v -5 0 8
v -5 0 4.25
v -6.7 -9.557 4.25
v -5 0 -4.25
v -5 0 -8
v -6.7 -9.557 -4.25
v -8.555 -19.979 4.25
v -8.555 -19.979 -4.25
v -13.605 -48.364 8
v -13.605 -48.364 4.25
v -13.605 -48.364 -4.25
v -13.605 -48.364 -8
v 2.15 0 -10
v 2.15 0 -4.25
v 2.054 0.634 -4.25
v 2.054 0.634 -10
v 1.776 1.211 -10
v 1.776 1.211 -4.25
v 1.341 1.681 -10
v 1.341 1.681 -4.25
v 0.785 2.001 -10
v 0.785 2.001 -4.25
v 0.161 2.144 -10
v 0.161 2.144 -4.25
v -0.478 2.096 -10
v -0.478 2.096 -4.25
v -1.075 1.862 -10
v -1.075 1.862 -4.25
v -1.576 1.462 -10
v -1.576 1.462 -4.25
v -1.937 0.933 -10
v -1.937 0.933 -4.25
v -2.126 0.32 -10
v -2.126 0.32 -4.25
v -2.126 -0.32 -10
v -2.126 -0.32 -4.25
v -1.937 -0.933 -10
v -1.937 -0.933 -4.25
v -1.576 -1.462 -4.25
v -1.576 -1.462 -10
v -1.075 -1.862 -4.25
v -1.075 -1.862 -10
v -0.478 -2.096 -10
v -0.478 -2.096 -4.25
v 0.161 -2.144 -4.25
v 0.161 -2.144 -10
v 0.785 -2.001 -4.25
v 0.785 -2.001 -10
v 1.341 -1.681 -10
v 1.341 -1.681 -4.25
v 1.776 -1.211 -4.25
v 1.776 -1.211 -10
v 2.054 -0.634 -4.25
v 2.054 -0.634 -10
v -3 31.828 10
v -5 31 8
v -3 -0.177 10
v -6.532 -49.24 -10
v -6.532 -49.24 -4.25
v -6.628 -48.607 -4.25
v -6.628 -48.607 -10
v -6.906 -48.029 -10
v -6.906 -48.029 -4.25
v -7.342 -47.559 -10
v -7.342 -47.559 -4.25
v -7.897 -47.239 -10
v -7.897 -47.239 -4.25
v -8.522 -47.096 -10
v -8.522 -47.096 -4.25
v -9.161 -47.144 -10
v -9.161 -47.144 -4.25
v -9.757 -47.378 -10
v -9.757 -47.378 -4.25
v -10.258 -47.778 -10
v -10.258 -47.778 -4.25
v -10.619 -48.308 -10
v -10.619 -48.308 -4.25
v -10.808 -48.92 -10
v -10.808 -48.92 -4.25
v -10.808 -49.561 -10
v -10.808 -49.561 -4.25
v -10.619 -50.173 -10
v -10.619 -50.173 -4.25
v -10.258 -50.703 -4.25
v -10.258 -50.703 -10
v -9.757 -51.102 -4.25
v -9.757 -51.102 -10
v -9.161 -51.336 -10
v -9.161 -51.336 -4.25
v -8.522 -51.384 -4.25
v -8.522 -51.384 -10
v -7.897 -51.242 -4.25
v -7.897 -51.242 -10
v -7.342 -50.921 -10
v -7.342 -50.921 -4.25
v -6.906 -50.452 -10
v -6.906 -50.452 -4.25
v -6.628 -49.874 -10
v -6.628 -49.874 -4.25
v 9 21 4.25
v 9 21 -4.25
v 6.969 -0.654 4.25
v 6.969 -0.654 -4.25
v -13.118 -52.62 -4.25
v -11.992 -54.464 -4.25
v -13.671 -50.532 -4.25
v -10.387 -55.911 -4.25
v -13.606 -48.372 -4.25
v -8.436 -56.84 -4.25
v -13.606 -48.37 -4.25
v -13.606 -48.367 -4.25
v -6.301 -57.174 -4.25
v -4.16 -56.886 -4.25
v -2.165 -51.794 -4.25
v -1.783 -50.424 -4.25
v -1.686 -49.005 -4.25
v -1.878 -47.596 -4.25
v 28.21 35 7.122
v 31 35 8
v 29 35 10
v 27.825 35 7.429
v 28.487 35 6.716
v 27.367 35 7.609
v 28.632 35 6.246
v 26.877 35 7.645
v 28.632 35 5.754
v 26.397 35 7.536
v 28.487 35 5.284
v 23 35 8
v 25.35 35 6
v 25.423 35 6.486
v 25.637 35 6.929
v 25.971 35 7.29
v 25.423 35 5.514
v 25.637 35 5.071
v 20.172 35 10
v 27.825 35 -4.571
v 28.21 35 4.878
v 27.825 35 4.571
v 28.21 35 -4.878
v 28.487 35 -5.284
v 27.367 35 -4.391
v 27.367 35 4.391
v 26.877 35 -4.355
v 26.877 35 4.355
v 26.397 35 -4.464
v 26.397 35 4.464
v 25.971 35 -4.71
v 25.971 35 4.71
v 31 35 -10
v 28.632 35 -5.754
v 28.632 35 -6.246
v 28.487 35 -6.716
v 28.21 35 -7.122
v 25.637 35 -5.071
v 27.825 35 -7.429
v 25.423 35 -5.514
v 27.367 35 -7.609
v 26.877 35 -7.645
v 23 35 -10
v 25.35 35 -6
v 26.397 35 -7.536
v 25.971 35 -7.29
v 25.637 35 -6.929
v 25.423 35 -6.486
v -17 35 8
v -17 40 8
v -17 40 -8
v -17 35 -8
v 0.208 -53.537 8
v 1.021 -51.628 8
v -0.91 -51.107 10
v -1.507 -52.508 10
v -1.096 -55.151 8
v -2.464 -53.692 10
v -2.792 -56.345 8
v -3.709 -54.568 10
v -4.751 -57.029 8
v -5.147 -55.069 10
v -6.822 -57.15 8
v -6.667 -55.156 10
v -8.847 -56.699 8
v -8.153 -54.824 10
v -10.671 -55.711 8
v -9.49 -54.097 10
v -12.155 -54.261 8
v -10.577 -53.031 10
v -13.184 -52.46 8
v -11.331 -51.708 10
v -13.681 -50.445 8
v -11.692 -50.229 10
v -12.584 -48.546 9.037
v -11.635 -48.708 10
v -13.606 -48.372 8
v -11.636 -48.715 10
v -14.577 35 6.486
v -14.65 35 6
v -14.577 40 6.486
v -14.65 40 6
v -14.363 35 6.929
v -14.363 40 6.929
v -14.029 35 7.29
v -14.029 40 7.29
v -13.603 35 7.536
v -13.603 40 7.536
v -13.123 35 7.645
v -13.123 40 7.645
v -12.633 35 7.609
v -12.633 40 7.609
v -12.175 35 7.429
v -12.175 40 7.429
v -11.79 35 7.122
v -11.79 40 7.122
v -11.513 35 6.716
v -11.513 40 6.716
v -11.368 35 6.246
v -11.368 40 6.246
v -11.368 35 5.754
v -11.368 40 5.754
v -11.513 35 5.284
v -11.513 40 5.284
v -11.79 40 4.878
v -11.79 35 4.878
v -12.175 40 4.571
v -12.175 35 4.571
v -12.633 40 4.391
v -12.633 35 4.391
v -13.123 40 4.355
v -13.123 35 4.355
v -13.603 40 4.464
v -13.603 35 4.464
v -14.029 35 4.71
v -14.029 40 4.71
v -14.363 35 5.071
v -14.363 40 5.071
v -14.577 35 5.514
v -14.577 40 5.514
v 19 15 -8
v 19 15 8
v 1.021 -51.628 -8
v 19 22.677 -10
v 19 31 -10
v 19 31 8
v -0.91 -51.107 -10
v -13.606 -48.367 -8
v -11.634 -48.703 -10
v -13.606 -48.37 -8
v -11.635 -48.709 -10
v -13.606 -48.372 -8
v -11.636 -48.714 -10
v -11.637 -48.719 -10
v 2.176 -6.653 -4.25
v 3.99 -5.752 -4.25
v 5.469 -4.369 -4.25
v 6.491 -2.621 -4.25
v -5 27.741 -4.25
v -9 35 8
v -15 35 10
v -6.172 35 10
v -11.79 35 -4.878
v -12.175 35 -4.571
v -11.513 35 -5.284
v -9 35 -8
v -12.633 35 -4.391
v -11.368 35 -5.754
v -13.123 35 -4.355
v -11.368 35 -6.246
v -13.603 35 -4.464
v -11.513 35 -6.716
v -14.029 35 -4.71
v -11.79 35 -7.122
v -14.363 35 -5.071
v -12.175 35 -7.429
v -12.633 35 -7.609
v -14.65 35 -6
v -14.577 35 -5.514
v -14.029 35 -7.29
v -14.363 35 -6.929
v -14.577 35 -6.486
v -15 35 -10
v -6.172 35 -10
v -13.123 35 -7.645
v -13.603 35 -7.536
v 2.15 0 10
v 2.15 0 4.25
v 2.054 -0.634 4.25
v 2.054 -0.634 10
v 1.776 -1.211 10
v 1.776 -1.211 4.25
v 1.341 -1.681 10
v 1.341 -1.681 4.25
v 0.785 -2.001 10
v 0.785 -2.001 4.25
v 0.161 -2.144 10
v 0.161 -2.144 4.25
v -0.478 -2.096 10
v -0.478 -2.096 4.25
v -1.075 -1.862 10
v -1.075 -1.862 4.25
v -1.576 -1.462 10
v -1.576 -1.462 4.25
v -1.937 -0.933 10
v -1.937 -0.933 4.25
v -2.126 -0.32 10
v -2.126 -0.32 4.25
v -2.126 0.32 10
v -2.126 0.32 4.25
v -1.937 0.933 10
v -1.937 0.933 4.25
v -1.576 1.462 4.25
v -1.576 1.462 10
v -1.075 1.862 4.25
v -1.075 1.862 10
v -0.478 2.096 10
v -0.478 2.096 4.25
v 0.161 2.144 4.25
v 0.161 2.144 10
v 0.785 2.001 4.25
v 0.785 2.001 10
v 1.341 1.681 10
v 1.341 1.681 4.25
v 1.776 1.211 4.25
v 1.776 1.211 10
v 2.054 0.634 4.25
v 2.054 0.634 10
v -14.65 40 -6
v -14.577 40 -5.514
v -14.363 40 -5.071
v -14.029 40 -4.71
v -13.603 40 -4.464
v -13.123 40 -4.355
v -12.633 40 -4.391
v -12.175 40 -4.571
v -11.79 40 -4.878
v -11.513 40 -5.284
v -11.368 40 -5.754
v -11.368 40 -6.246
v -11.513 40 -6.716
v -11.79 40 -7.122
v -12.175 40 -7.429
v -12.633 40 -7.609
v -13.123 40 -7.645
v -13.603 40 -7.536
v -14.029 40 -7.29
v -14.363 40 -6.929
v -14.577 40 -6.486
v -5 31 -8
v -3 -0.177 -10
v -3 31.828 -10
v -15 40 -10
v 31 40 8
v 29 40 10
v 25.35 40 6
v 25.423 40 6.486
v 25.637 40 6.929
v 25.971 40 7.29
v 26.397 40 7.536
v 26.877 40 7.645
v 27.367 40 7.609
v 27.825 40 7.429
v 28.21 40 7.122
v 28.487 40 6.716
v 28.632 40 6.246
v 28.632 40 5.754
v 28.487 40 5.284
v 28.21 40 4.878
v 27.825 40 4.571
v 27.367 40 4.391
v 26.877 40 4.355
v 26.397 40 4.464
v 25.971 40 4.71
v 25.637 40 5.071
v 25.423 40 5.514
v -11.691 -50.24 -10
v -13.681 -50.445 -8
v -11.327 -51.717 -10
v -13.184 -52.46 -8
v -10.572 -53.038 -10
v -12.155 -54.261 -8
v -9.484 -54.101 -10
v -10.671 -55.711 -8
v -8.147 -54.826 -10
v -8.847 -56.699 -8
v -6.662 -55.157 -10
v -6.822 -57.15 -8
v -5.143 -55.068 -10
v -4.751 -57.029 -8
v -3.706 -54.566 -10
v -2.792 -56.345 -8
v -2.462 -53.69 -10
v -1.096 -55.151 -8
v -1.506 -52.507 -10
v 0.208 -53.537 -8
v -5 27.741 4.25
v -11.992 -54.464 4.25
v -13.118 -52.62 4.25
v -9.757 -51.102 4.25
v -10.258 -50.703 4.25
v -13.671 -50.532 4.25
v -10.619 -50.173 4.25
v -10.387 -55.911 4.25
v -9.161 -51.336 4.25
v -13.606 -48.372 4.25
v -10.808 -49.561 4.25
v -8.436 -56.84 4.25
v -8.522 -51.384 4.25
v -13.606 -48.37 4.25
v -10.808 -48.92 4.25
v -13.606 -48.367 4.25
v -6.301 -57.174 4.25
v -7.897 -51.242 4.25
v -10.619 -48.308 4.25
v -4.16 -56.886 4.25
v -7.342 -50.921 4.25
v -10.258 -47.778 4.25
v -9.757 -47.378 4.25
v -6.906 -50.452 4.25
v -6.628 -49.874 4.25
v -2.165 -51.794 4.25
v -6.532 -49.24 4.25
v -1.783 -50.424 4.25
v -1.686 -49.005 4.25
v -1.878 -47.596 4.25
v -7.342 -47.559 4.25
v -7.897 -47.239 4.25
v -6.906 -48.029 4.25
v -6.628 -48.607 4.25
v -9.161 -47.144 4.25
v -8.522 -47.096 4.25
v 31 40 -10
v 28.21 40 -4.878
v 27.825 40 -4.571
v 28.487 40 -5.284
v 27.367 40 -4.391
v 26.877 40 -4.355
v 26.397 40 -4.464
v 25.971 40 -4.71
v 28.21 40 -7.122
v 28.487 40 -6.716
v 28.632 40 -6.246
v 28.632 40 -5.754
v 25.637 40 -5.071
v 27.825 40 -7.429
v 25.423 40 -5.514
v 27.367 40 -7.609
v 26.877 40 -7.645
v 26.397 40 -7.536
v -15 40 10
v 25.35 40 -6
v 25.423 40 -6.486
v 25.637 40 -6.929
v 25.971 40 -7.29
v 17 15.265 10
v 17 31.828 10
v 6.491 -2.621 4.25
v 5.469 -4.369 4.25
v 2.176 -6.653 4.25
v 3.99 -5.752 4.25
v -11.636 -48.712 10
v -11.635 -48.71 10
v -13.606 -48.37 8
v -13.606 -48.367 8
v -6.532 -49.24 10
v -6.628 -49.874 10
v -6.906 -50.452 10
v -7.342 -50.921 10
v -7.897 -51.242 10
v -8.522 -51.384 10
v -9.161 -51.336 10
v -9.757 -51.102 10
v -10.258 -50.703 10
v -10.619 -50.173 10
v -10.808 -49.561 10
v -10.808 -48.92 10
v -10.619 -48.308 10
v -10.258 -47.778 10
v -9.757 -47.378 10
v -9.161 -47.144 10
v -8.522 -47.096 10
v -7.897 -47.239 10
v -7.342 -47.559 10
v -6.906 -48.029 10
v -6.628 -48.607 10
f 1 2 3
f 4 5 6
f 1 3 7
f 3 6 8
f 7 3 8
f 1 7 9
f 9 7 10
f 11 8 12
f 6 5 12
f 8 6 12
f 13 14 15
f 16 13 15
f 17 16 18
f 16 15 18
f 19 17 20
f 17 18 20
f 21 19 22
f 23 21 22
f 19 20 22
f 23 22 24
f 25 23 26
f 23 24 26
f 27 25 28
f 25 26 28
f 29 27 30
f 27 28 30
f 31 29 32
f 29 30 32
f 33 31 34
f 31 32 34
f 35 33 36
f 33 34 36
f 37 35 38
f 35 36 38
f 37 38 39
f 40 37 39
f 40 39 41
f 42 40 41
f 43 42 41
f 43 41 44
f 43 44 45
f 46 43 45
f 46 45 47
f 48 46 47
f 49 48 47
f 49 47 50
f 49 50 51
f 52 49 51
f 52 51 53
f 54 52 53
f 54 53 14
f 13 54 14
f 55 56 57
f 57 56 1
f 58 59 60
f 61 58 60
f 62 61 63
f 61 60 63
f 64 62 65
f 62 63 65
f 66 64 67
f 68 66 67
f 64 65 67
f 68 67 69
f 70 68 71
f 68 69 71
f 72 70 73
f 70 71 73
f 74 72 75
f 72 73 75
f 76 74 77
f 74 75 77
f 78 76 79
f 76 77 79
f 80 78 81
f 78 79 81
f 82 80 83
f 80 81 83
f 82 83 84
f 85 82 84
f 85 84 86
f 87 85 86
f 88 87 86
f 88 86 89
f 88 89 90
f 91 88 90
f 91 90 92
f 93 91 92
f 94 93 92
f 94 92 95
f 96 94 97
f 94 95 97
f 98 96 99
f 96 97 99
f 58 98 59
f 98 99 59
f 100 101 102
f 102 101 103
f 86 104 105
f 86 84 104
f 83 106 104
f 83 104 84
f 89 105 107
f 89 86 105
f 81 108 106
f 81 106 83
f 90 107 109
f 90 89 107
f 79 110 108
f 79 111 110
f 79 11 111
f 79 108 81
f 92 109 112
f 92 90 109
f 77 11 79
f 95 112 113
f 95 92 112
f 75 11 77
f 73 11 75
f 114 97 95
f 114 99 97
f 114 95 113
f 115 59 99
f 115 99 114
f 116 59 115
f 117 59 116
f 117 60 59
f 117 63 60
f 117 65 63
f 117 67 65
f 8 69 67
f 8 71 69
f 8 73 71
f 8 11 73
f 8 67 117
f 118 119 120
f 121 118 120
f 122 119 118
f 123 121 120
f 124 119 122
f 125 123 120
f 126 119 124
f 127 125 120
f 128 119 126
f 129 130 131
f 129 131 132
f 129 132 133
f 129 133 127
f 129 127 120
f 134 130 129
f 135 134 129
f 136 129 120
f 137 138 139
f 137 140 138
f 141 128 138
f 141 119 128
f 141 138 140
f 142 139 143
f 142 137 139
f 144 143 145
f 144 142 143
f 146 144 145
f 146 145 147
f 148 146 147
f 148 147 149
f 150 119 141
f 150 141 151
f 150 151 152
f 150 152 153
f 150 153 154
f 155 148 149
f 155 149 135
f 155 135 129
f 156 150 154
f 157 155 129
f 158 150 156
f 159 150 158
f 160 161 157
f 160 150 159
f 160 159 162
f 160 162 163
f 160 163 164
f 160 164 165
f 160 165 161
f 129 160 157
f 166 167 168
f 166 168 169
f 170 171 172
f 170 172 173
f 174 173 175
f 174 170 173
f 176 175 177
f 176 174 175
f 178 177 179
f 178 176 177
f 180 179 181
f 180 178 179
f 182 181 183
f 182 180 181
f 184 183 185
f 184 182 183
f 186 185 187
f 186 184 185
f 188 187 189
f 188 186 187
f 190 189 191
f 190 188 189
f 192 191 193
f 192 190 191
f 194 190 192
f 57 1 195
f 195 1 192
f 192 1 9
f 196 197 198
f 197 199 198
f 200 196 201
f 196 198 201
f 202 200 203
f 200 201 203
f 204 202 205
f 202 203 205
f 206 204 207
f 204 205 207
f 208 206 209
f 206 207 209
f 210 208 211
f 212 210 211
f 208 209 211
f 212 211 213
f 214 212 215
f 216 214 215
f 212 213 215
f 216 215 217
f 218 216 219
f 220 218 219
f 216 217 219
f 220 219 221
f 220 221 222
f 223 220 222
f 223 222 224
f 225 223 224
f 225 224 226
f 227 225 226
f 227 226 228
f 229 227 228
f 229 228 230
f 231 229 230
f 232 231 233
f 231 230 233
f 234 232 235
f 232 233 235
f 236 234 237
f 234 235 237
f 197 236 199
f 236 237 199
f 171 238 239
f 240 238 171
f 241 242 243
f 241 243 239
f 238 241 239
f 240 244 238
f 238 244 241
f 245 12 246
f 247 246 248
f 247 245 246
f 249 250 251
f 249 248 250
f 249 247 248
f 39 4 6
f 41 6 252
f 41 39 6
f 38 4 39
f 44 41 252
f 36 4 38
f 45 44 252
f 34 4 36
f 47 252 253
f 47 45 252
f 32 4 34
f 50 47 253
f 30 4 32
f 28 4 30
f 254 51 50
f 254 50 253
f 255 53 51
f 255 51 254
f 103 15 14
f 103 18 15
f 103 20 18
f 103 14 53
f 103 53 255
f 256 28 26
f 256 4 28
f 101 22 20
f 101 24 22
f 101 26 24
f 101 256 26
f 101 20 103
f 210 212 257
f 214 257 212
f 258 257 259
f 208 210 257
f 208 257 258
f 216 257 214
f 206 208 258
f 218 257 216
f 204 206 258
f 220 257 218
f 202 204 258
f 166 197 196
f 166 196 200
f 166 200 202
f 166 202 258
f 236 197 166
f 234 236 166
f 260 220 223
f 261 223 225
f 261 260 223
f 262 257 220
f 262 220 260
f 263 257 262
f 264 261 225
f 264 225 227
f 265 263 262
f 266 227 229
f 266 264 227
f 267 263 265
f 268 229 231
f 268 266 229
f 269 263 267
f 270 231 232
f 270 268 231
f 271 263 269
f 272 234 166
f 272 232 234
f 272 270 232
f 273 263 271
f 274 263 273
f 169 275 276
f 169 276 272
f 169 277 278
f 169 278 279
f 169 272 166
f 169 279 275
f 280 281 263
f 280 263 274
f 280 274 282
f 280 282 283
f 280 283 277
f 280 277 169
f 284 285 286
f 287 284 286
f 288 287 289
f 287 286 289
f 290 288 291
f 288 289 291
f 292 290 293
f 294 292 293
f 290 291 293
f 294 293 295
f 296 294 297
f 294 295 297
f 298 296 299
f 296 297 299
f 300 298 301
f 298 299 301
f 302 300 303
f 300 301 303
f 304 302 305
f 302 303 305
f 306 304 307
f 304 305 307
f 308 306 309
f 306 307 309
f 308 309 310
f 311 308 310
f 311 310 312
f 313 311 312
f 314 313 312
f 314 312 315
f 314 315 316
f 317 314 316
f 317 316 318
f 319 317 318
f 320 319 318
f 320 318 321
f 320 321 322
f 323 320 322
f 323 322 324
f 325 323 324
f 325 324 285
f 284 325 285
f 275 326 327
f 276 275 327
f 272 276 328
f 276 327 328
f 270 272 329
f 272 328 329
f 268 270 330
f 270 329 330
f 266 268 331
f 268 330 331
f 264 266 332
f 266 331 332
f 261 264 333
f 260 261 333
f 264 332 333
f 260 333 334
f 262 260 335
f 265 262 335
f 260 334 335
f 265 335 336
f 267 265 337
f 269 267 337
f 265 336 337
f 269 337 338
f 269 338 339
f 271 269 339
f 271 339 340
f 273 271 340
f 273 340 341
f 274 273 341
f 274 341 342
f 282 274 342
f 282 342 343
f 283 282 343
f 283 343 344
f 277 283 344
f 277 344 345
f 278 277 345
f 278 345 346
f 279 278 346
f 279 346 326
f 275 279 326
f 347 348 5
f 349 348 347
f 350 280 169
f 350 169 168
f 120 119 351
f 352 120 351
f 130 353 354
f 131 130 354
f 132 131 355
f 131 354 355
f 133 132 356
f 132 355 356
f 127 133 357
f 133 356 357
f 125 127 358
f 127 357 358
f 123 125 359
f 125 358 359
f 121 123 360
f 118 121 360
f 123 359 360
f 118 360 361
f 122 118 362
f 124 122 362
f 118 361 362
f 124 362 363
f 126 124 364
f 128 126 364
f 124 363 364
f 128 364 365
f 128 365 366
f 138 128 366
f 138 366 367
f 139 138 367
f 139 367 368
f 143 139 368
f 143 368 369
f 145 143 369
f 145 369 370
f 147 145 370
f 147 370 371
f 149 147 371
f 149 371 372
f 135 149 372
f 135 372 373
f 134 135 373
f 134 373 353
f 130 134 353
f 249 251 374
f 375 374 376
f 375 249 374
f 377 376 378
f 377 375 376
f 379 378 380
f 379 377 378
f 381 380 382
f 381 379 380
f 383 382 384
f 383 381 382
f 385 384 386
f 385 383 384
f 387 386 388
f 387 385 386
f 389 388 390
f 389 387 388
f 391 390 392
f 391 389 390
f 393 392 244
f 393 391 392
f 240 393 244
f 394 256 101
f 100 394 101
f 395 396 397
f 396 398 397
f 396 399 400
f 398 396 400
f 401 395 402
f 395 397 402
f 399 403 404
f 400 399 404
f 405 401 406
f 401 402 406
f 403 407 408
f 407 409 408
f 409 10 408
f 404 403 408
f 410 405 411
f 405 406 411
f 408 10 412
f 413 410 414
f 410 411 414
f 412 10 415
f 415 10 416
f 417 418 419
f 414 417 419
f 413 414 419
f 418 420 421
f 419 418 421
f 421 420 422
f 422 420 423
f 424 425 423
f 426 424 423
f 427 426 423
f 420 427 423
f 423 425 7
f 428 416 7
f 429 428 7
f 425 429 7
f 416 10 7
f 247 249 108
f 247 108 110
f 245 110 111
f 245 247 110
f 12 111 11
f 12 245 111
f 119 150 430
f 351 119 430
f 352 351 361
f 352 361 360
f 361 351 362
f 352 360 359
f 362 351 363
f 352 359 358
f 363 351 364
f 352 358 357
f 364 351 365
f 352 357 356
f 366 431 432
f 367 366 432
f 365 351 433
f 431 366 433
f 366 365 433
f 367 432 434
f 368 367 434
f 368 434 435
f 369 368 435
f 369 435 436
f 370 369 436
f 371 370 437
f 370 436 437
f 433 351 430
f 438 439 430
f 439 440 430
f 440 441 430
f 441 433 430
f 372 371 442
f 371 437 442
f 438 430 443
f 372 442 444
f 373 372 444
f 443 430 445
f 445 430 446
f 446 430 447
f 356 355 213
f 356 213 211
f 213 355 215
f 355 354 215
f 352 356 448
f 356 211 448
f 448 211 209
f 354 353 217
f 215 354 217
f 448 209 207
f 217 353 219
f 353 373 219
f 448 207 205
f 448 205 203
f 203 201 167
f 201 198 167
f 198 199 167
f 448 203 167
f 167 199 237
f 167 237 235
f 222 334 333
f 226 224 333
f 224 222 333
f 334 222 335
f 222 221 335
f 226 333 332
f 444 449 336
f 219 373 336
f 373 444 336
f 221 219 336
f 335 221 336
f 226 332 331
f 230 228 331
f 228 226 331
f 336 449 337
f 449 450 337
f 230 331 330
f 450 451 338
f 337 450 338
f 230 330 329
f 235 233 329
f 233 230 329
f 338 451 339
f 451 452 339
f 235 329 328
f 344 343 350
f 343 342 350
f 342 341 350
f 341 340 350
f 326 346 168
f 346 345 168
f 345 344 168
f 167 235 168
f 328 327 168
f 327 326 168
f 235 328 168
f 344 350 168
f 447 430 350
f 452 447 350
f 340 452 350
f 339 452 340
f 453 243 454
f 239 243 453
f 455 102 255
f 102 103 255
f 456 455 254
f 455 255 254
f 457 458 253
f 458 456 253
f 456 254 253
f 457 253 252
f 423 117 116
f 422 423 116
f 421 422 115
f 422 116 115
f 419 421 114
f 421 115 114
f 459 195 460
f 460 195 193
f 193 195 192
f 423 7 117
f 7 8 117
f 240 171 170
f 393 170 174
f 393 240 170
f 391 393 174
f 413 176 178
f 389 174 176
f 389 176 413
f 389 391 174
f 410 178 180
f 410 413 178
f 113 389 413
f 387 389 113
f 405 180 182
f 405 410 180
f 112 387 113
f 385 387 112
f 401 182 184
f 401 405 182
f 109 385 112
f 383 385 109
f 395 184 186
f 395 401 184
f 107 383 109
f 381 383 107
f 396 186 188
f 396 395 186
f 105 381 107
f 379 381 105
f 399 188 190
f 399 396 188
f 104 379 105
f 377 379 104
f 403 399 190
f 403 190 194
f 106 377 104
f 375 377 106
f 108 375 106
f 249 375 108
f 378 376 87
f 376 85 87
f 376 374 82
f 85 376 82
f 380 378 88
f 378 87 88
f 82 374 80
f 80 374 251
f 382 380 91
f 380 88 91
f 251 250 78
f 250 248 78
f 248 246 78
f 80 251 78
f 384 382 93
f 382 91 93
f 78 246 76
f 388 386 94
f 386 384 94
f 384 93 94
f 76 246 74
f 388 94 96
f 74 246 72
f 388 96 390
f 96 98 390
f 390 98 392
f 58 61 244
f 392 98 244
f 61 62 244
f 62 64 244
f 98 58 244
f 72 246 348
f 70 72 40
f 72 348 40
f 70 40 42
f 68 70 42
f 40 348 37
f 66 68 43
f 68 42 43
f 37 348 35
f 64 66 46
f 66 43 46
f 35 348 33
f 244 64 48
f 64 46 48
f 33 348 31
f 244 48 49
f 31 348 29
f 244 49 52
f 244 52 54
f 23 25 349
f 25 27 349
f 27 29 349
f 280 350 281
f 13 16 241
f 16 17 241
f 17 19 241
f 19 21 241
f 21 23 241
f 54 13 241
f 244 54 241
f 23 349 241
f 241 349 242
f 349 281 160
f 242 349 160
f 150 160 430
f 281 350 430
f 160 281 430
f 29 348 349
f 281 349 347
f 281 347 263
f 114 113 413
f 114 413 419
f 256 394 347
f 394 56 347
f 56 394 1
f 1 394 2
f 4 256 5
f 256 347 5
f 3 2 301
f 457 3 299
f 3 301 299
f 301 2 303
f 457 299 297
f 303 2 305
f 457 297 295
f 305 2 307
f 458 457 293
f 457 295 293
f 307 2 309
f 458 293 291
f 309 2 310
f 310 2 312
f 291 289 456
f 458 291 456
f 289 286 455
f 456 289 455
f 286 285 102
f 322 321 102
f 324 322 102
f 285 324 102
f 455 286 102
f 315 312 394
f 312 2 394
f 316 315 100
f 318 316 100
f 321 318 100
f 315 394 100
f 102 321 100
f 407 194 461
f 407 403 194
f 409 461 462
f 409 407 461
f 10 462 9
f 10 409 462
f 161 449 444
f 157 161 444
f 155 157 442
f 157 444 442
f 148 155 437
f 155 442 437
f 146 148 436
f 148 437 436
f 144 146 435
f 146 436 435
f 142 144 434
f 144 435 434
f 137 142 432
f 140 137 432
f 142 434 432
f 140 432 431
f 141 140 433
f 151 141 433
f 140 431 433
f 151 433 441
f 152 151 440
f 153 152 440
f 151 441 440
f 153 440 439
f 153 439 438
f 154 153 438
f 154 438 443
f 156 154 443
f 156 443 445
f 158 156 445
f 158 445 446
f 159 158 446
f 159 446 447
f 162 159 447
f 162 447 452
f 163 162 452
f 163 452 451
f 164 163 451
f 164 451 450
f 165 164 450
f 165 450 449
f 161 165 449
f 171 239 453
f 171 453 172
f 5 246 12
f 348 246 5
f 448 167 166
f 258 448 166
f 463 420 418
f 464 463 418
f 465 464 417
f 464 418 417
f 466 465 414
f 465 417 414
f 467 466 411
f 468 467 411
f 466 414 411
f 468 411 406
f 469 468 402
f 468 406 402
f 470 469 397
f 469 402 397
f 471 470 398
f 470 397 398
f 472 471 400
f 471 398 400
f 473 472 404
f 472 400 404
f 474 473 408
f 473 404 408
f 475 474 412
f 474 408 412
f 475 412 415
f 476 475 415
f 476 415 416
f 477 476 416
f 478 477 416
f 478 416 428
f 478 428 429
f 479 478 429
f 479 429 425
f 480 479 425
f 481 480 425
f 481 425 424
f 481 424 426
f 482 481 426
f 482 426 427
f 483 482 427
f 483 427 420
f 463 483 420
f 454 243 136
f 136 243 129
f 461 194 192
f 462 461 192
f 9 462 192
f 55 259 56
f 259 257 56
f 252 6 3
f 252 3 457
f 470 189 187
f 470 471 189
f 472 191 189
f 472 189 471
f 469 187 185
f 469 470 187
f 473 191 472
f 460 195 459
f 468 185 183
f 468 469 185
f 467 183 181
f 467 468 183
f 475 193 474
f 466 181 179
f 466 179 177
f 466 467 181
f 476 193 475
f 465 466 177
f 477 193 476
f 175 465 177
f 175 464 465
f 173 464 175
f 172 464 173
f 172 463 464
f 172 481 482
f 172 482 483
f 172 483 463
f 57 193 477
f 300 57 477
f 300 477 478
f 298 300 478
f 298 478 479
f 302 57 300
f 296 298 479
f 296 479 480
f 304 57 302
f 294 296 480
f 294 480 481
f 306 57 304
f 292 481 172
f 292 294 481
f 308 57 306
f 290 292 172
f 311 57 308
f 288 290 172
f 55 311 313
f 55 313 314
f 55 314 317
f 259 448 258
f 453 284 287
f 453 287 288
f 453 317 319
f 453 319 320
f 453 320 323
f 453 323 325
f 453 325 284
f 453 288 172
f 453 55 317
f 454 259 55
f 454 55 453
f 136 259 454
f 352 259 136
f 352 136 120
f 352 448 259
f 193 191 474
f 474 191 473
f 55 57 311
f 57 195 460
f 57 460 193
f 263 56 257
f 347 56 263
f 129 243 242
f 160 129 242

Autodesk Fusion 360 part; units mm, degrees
sketch "Sketch1" plane through (0, 0, 0) normal (0, 0, 1) x (1, 0, 0)
  line L0 (-17, 40) -> (-17, 35)
  line L1 (-5, 0) -> (-13.6051, -48.3645)
  line L2 (-5, 35) -> (-17, 35)
  line L3 (-6.5651, -49.6137) -> (-6.2204, -49.6745)
  circle A0 centre (0, 0) radius 2.15
  line L4 (23, 35) -> (19, 35)
  circle A1 centre (-8.6824, -49.2404) radius 2.15
  line L5 (19, 15) -> (1.0206, -51.6285)
  line L6 (9.1345, 0) -> (2.15, 0)
  line L7 (31, 40) -> (-17, 40)
  line L8 (19, 35) -> (19, 15)
  line L9 (31, 35) -> (31, 40)
  line L10 (5, 35) -> (-5, 35)
  line L11 (31, 35) -> (19, 35)
  line L12 (-5, 35) -> (-5, 0)
  arc A2 (-13.6051, -48.3645) -> (-13.6064, -48.3721) centre (-8.6824, -49.2404) ccw
  arc A3 (-13.6044, -48.3607) -> (1.0206, -51.6285) centre (-6.2204, -49.6745) ccw
  line L13 (-5, 0) -> (-2.15, 0)
  line L14 (2.15, 0) -> (5, 0)
  line L15 (-17, 35) -> (-5, 35)
  line L16 (19, 35) -> (31, 35)
  line L17 (-17, 35) -> (-5, 35)
  line L18 (19, 35) -> (31, 35)
  dimension "d1" = 4.3
  dimension "d2" = 48
  dimension "d4" = 5
  dimension "d5" = 4.3
  dimension "d6" = 10
  dimension "d7" = 12
  dimension "d9" = 50
  dimension "d10" = 15
  dimension "d11" = 20
extrude "Extrude1" add sketch "Sketch1" along normal mid plane 20
sketch "Sketch2" plane through (0, 40, 0) normal (0, 1, 0) x (-1, 0, 0)
  line L0 (17, -10) -> (17, 10)
  line L1 (17, 10) -> (-31, 10)
  line L2 (-31, 10) -> (-31, -10)
  line L3 (-31, -10) -> (17, -10)
  circle A0 centre (-27, -6) radius 1.65
  circle A1 centre (13, 6) radius 1.65
  line L4 (13, 6) -> (13, -6)
  line L5 (-7, 0) -> (-7, -6)
  line L6 (-7, 0) -> (-31, 0)
  line L7 (13, -6) -> (-27, -6)
  line L8 (-27, 6) -> (13, 6)
  line L9 (-7, 0) -> (-7, -10)
  line L10 (-31, -10) -> (17, -10)
  line L11 (-31, 10) -> (-31, -10)
  line L12 (-7, 0) -> (-27, 0)
  line L13 (17, -10) -> (17, 10)
  line L14 (17, 10) -> (-31, 10)
  circle A2 centre (13, -6) radius 1.65
  circle A3 centre (-27, 6) radius 1.65
  line L15 (-27, -6) -> (-27, 6)
  dimension "d15" = 40
  dimension "d16" = 12
  dimension "d17" = 3.3
  dimension "d18" = 3.3
  dimension "d19" = 3.3
  dimension "d20" = 3.3
extrude "Extrude2" cut sketch "Sketch2" against normal up to surface (5 mm away) contours A0 L7 L15 | A0 L7 L15 | L4 L7 A2 | L4 L7 A2 | L8 A3 L15 | L8 A3 L15 | A1 L4 L8 | A1 L4 L8
chamfer "Chamfer1" distance 4 angle 45 2 edges at (-5, 35, 0) (19, 35, 0)
chamfer "Chamfer2" distance 2 angle 45 15 edges at (-7, 33, -10) (-17, 37.5, -10) (-5, 15.5, -10) (-9.3022, -24.1804, -10) (10.0103, -18.3142, -10) (-7.8558, -56.994, -10) (-5, 15.5, 10) (-9.3022, -24.1804, 10) (-7.8558, -56.994, 10) (10.0103, -18.3142, 10) (-7, 33, 10) (-17, 37.5, 10) (31, 37.5, 10) (21, 33, 10) (19, 23, 10)
sketch "Sketch3" plane through (0, 0, 0) normal (0, 0, 1) x (1, 0, 0)
  line L0 (-14, -82) -> (-2.1648, -51.7941)
  circle A0 centre (-8.6824, -49.2404) radius 7
  line L1 (-14, -82) -> (-60, -70)
  line L2 (9, 21) -> (6.9694, -0.6536)
  line L3 (-60, -70) -> (-51.4576, 32.3922)
  line L4 (-18, 34) -> (9, 21)
  line L5 (-9.4078, -10.4426) -> (2.1764, -6.6531)
  line L6 (-51.4576, 32.3922) -> (-18, 34)
  circle A1 centre (0, 0) radius 7
  line L7 (-10, -14) -> (-1.8784, -47.5955)
  line L8 (-9.4078, -10.4426) -> (-10, -14)
  circle A2 centre (0, 0) radius 2.15
  circle A3 centre (-8.6824, -49.2404) radius 2.15
  dimension "d25" = 14
  dimension "d26" = 14
extrude "Extrude3" cut sketch "Sketch3" along normal mid plane 8.5
